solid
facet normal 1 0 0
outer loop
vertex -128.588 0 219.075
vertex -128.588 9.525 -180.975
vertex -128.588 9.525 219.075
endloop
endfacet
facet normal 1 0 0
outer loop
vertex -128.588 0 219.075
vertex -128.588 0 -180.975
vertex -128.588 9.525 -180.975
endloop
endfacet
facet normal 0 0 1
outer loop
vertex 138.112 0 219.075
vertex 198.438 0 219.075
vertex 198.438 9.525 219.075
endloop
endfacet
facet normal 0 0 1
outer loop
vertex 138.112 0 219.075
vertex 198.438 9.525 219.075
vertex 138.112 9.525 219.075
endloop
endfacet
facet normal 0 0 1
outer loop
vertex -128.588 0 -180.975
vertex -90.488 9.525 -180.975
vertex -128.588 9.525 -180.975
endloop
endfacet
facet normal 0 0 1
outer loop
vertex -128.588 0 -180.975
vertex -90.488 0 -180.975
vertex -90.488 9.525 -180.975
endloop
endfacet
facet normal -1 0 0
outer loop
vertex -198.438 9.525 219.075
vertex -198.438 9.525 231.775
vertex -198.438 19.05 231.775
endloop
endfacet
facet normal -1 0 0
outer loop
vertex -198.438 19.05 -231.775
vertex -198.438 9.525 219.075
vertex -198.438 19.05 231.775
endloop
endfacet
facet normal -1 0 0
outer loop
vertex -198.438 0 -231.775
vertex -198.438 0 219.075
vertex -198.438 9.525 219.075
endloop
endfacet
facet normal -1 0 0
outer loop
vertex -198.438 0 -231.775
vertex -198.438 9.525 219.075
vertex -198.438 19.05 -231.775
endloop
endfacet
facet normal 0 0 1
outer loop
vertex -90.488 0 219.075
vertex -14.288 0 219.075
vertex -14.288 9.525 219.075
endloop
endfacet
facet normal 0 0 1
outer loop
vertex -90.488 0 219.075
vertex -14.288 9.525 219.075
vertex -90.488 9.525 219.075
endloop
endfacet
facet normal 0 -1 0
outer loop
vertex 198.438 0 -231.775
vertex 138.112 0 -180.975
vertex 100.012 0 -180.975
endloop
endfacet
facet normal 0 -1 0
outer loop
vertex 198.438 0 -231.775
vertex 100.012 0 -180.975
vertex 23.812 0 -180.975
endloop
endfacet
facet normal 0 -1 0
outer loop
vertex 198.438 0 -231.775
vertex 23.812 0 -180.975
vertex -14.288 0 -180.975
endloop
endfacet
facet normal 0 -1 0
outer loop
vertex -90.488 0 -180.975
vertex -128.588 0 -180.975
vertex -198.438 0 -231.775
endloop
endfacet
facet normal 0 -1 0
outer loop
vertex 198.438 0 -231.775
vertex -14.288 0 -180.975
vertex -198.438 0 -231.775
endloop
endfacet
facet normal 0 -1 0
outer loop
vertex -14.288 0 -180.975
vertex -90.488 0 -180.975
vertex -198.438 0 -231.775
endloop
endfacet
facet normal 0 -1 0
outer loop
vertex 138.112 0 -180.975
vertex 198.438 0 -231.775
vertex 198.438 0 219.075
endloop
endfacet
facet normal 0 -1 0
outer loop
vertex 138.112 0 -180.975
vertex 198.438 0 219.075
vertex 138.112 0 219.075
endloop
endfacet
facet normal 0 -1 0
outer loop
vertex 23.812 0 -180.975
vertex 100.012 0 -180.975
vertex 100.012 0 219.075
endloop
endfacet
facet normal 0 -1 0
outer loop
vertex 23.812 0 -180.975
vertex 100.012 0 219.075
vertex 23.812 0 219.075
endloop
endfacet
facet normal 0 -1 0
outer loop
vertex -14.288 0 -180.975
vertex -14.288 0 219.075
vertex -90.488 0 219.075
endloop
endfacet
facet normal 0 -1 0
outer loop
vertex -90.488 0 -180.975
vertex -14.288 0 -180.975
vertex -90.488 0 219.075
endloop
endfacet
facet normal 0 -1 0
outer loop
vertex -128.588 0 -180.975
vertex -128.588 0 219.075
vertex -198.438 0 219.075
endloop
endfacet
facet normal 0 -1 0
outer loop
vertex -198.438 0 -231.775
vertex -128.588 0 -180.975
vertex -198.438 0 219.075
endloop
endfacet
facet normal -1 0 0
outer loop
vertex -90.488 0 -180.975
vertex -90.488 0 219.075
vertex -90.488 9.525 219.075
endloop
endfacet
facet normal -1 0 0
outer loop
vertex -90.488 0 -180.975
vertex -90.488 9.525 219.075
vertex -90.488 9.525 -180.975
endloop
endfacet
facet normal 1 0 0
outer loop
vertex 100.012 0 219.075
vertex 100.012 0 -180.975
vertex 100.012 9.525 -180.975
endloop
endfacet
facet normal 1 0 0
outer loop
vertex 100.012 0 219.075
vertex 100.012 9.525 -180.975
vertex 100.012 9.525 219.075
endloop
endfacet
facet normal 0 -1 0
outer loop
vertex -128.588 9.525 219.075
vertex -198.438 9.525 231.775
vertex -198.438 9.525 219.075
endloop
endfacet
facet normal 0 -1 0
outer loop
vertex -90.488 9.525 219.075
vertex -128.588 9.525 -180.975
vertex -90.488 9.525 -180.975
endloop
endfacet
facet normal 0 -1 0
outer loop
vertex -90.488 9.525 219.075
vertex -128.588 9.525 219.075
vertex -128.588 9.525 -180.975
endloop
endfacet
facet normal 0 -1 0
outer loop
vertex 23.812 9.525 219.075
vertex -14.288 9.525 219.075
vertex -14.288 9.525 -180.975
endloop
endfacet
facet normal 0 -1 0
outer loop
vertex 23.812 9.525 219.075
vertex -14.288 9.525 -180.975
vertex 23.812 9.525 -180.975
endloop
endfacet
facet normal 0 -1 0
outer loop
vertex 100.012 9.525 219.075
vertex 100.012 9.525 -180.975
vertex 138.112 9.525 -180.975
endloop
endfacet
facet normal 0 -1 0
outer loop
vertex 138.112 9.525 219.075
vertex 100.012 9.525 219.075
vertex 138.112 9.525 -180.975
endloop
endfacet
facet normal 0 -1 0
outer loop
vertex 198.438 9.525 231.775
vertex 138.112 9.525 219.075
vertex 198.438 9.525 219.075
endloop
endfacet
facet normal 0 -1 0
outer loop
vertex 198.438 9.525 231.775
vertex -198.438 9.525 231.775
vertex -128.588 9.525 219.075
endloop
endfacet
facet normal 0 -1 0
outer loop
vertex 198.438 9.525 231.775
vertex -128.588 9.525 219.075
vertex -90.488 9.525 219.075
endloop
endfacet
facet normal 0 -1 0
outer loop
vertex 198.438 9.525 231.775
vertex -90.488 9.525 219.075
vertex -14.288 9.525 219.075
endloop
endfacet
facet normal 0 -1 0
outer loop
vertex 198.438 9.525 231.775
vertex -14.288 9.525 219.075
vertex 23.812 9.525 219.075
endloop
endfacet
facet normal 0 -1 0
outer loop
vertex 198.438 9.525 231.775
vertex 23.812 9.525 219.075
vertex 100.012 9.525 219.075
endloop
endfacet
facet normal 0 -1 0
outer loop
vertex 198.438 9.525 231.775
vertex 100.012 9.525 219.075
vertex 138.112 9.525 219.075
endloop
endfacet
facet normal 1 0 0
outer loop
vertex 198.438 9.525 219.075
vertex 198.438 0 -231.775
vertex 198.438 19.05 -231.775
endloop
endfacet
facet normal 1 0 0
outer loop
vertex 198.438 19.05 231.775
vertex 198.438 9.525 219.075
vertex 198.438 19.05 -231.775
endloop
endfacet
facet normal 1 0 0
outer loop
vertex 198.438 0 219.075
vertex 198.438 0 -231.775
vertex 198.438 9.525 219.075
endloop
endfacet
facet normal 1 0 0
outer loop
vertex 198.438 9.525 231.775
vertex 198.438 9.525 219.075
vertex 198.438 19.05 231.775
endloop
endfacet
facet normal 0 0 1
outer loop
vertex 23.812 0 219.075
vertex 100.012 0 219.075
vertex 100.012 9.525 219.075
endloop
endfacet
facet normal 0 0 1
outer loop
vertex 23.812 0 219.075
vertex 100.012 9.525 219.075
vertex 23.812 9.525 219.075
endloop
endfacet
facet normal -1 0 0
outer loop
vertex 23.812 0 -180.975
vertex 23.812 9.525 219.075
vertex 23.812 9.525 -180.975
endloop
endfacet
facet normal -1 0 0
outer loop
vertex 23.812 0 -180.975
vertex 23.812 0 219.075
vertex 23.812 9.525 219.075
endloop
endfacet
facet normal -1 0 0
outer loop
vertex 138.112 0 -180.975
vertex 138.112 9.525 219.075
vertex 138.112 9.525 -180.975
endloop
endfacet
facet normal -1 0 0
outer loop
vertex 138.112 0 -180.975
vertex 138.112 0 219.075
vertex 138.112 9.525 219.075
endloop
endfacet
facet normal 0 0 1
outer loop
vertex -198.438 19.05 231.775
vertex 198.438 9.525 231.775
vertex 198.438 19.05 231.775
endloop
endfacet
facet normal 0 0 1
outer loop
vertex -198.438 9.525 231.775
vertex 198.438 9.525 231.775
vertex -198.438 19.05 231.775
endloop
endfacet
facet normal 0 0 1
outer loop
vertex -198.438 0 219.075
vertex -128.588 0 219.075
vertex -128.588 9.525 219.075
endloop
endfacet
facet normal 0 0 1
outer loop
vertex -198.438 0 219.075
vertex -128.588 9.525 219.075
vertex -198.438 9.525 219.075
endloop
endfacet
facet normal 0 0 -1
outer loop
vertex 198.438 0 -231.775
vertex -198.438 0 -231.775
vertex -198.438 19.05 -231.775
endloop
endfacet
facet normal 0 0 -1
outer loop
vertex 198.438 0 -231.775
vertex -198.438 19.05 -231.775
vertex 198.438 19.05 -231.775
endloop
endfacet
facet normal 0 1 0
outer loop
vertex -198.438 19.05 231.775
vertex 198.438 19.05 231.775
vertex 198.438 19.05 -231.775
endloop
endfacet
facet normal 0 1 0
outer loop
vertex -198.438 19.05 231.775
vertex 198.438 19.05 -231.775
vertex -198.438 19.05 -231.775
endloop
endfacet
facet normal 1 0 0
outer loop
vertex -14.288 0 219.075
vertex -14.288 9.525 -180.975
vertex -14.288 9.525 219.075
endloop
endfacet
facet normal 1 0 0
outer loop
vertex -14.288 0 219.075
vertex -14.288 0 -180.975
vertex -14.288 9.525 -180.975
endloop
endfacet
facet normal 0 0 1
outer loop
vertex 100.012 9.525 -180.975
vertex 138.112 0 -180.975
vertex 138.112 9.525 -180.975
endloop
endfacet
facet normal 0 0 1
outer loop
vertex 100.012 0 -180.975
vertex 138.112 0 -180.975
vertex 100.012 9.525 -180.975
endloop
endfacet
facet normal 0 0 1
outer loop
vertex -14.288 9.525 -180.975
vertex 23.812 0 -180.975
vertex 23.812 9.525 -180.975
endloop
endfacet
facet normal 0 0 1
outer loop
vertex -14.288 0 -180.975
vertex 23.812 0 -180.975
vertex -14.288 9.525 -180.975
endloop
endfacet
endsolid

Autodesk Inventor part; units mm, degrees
ref_plane "YZ Plane" through (0, 0, 0) normal (1, 0, 0) x (0, 1, 0)
ref_plane "XZ Plane" through (0, 0, 0) normal (0, 1, 0) x (-1, 0, 0)
ref_plane "XY Plane" through (0, 0, 0) normal (0, 0, 1) x (1, 0, 0)
sketch "Sketch1" plane through (0, 0, 0) normal (0, 1, 0) x (-1, 0, 0)
  line L0 (198.4375, -231.775) -> (-198.4375, -231.775)
  line L1 (-198.4375, -231.775) -> (-198.4375, 231.775)
  line L2 (-198.4375, 231.775) -> (198.4375, 231.775)
  line L3 (198.4375, 231.775) -> (198.4375, -231.775)
  line L4 (0, -324.485) -> (0, 324.485) projected
  line L5 (277.8125, 0) -> (-277.8125, 0) projected
  point P0 (0, 0)
  dimension "d0" = 396.875
  dimension "d1" = 463.55
  dimension "d4" = 198.4375
  dimension "d8" = 231.775
extrude "Shelf Board" add sketch "Sketch1" along normal blind 19.05
sketch "Sketch3" plane through (0, 0, 0) normal (0, -1, 0) x (1, 0, 0)
  line L0 (-198.4375, 231.775) -> (198.4375, 231.775) projected
  line L1 (-128.5875, 231.775) -> (-90.4875, 231.775)
  line L2 (-90.4875, 231.775) -> (-90.4875, -180.975)
  line L3 (-90.4875, -180.975) -> (-128.5875, -180.975)
  line L4 (-128.5875, -180.975) -> (-128.5875, 231.775)
  line L5 (-198.4375, -231.775) -> (198.4375, -231.775) projected
  line L6 (-198.4375, 231.775) -> (-198.4375, -231.775) projected
  line L7 (-14.2875, 231.775) -> (23.8125, 231.775)
  line L8 (23.8125, 231.775) -> (23.8125, -180.975)
  line L9 (23.8125, -180.975) -> (-14.2875, -180.975)
  line L10 (-14.2875, -180.975) -> (-14.2875, 231.775)
  line L11 (198.4375, 231.775) -> (-198.4375, 231.775) projected
  line L12 (100.0125, 231.775) -> (138.1125, 231.775)
  line L13 (138.1125, 231.775) -> (138.1125, -180.975)
  line L14 (138.1125, -180.975) -> (100.0125, -180.975)
  line L15 (100.0125, -180.975) -> (100.0125, 231.775)
  line L16 (198.4375, 231.775) -> (198.4375, -231.775) projected
  line L17 (-198.4375, 231.775) -> (198.4375, 231.775)
  line L18 (198.4375, 231.775) -> (198.4375, 219.075)
  line L19 (198.4375, 219.075) -> (-198.4375, 219.075)
  line L20 (-198.4375, 219.075) -> (-198.4375, 231.775)
  point P0 (0, 0)
  dimension "d11" = 50.8
  dimension "d12" = 38.1
  dimension "d13" = 69.85
  dimension "d20" = 12.7
  dimension "d22" = 396.875
  dimension "d25" = 76.2
  dimension "d26" = 76.2
  dimension "d27" = 60.325
extrude "Light Stop Dados" cut sketch "Sketch3" against normal blind 9.525 contours L0 L4 L19 L6 | L0 L2 L19 L4 | L0 L10 L19 L2 | L19 L2 L3 L4 | L0 L8 L19 L10 | L0 L15 L19 L8 | L19 L8 L9 L10 | L19 L13 L0 L16 | L0 L13 L19 L15 | L13 L14 L15 L19
equation "\"d4\" = 0.5 * d0"
equation "\"d8\" = 0.5 * d1"
properties part number "Horizontal Shelf with Lights Left"
